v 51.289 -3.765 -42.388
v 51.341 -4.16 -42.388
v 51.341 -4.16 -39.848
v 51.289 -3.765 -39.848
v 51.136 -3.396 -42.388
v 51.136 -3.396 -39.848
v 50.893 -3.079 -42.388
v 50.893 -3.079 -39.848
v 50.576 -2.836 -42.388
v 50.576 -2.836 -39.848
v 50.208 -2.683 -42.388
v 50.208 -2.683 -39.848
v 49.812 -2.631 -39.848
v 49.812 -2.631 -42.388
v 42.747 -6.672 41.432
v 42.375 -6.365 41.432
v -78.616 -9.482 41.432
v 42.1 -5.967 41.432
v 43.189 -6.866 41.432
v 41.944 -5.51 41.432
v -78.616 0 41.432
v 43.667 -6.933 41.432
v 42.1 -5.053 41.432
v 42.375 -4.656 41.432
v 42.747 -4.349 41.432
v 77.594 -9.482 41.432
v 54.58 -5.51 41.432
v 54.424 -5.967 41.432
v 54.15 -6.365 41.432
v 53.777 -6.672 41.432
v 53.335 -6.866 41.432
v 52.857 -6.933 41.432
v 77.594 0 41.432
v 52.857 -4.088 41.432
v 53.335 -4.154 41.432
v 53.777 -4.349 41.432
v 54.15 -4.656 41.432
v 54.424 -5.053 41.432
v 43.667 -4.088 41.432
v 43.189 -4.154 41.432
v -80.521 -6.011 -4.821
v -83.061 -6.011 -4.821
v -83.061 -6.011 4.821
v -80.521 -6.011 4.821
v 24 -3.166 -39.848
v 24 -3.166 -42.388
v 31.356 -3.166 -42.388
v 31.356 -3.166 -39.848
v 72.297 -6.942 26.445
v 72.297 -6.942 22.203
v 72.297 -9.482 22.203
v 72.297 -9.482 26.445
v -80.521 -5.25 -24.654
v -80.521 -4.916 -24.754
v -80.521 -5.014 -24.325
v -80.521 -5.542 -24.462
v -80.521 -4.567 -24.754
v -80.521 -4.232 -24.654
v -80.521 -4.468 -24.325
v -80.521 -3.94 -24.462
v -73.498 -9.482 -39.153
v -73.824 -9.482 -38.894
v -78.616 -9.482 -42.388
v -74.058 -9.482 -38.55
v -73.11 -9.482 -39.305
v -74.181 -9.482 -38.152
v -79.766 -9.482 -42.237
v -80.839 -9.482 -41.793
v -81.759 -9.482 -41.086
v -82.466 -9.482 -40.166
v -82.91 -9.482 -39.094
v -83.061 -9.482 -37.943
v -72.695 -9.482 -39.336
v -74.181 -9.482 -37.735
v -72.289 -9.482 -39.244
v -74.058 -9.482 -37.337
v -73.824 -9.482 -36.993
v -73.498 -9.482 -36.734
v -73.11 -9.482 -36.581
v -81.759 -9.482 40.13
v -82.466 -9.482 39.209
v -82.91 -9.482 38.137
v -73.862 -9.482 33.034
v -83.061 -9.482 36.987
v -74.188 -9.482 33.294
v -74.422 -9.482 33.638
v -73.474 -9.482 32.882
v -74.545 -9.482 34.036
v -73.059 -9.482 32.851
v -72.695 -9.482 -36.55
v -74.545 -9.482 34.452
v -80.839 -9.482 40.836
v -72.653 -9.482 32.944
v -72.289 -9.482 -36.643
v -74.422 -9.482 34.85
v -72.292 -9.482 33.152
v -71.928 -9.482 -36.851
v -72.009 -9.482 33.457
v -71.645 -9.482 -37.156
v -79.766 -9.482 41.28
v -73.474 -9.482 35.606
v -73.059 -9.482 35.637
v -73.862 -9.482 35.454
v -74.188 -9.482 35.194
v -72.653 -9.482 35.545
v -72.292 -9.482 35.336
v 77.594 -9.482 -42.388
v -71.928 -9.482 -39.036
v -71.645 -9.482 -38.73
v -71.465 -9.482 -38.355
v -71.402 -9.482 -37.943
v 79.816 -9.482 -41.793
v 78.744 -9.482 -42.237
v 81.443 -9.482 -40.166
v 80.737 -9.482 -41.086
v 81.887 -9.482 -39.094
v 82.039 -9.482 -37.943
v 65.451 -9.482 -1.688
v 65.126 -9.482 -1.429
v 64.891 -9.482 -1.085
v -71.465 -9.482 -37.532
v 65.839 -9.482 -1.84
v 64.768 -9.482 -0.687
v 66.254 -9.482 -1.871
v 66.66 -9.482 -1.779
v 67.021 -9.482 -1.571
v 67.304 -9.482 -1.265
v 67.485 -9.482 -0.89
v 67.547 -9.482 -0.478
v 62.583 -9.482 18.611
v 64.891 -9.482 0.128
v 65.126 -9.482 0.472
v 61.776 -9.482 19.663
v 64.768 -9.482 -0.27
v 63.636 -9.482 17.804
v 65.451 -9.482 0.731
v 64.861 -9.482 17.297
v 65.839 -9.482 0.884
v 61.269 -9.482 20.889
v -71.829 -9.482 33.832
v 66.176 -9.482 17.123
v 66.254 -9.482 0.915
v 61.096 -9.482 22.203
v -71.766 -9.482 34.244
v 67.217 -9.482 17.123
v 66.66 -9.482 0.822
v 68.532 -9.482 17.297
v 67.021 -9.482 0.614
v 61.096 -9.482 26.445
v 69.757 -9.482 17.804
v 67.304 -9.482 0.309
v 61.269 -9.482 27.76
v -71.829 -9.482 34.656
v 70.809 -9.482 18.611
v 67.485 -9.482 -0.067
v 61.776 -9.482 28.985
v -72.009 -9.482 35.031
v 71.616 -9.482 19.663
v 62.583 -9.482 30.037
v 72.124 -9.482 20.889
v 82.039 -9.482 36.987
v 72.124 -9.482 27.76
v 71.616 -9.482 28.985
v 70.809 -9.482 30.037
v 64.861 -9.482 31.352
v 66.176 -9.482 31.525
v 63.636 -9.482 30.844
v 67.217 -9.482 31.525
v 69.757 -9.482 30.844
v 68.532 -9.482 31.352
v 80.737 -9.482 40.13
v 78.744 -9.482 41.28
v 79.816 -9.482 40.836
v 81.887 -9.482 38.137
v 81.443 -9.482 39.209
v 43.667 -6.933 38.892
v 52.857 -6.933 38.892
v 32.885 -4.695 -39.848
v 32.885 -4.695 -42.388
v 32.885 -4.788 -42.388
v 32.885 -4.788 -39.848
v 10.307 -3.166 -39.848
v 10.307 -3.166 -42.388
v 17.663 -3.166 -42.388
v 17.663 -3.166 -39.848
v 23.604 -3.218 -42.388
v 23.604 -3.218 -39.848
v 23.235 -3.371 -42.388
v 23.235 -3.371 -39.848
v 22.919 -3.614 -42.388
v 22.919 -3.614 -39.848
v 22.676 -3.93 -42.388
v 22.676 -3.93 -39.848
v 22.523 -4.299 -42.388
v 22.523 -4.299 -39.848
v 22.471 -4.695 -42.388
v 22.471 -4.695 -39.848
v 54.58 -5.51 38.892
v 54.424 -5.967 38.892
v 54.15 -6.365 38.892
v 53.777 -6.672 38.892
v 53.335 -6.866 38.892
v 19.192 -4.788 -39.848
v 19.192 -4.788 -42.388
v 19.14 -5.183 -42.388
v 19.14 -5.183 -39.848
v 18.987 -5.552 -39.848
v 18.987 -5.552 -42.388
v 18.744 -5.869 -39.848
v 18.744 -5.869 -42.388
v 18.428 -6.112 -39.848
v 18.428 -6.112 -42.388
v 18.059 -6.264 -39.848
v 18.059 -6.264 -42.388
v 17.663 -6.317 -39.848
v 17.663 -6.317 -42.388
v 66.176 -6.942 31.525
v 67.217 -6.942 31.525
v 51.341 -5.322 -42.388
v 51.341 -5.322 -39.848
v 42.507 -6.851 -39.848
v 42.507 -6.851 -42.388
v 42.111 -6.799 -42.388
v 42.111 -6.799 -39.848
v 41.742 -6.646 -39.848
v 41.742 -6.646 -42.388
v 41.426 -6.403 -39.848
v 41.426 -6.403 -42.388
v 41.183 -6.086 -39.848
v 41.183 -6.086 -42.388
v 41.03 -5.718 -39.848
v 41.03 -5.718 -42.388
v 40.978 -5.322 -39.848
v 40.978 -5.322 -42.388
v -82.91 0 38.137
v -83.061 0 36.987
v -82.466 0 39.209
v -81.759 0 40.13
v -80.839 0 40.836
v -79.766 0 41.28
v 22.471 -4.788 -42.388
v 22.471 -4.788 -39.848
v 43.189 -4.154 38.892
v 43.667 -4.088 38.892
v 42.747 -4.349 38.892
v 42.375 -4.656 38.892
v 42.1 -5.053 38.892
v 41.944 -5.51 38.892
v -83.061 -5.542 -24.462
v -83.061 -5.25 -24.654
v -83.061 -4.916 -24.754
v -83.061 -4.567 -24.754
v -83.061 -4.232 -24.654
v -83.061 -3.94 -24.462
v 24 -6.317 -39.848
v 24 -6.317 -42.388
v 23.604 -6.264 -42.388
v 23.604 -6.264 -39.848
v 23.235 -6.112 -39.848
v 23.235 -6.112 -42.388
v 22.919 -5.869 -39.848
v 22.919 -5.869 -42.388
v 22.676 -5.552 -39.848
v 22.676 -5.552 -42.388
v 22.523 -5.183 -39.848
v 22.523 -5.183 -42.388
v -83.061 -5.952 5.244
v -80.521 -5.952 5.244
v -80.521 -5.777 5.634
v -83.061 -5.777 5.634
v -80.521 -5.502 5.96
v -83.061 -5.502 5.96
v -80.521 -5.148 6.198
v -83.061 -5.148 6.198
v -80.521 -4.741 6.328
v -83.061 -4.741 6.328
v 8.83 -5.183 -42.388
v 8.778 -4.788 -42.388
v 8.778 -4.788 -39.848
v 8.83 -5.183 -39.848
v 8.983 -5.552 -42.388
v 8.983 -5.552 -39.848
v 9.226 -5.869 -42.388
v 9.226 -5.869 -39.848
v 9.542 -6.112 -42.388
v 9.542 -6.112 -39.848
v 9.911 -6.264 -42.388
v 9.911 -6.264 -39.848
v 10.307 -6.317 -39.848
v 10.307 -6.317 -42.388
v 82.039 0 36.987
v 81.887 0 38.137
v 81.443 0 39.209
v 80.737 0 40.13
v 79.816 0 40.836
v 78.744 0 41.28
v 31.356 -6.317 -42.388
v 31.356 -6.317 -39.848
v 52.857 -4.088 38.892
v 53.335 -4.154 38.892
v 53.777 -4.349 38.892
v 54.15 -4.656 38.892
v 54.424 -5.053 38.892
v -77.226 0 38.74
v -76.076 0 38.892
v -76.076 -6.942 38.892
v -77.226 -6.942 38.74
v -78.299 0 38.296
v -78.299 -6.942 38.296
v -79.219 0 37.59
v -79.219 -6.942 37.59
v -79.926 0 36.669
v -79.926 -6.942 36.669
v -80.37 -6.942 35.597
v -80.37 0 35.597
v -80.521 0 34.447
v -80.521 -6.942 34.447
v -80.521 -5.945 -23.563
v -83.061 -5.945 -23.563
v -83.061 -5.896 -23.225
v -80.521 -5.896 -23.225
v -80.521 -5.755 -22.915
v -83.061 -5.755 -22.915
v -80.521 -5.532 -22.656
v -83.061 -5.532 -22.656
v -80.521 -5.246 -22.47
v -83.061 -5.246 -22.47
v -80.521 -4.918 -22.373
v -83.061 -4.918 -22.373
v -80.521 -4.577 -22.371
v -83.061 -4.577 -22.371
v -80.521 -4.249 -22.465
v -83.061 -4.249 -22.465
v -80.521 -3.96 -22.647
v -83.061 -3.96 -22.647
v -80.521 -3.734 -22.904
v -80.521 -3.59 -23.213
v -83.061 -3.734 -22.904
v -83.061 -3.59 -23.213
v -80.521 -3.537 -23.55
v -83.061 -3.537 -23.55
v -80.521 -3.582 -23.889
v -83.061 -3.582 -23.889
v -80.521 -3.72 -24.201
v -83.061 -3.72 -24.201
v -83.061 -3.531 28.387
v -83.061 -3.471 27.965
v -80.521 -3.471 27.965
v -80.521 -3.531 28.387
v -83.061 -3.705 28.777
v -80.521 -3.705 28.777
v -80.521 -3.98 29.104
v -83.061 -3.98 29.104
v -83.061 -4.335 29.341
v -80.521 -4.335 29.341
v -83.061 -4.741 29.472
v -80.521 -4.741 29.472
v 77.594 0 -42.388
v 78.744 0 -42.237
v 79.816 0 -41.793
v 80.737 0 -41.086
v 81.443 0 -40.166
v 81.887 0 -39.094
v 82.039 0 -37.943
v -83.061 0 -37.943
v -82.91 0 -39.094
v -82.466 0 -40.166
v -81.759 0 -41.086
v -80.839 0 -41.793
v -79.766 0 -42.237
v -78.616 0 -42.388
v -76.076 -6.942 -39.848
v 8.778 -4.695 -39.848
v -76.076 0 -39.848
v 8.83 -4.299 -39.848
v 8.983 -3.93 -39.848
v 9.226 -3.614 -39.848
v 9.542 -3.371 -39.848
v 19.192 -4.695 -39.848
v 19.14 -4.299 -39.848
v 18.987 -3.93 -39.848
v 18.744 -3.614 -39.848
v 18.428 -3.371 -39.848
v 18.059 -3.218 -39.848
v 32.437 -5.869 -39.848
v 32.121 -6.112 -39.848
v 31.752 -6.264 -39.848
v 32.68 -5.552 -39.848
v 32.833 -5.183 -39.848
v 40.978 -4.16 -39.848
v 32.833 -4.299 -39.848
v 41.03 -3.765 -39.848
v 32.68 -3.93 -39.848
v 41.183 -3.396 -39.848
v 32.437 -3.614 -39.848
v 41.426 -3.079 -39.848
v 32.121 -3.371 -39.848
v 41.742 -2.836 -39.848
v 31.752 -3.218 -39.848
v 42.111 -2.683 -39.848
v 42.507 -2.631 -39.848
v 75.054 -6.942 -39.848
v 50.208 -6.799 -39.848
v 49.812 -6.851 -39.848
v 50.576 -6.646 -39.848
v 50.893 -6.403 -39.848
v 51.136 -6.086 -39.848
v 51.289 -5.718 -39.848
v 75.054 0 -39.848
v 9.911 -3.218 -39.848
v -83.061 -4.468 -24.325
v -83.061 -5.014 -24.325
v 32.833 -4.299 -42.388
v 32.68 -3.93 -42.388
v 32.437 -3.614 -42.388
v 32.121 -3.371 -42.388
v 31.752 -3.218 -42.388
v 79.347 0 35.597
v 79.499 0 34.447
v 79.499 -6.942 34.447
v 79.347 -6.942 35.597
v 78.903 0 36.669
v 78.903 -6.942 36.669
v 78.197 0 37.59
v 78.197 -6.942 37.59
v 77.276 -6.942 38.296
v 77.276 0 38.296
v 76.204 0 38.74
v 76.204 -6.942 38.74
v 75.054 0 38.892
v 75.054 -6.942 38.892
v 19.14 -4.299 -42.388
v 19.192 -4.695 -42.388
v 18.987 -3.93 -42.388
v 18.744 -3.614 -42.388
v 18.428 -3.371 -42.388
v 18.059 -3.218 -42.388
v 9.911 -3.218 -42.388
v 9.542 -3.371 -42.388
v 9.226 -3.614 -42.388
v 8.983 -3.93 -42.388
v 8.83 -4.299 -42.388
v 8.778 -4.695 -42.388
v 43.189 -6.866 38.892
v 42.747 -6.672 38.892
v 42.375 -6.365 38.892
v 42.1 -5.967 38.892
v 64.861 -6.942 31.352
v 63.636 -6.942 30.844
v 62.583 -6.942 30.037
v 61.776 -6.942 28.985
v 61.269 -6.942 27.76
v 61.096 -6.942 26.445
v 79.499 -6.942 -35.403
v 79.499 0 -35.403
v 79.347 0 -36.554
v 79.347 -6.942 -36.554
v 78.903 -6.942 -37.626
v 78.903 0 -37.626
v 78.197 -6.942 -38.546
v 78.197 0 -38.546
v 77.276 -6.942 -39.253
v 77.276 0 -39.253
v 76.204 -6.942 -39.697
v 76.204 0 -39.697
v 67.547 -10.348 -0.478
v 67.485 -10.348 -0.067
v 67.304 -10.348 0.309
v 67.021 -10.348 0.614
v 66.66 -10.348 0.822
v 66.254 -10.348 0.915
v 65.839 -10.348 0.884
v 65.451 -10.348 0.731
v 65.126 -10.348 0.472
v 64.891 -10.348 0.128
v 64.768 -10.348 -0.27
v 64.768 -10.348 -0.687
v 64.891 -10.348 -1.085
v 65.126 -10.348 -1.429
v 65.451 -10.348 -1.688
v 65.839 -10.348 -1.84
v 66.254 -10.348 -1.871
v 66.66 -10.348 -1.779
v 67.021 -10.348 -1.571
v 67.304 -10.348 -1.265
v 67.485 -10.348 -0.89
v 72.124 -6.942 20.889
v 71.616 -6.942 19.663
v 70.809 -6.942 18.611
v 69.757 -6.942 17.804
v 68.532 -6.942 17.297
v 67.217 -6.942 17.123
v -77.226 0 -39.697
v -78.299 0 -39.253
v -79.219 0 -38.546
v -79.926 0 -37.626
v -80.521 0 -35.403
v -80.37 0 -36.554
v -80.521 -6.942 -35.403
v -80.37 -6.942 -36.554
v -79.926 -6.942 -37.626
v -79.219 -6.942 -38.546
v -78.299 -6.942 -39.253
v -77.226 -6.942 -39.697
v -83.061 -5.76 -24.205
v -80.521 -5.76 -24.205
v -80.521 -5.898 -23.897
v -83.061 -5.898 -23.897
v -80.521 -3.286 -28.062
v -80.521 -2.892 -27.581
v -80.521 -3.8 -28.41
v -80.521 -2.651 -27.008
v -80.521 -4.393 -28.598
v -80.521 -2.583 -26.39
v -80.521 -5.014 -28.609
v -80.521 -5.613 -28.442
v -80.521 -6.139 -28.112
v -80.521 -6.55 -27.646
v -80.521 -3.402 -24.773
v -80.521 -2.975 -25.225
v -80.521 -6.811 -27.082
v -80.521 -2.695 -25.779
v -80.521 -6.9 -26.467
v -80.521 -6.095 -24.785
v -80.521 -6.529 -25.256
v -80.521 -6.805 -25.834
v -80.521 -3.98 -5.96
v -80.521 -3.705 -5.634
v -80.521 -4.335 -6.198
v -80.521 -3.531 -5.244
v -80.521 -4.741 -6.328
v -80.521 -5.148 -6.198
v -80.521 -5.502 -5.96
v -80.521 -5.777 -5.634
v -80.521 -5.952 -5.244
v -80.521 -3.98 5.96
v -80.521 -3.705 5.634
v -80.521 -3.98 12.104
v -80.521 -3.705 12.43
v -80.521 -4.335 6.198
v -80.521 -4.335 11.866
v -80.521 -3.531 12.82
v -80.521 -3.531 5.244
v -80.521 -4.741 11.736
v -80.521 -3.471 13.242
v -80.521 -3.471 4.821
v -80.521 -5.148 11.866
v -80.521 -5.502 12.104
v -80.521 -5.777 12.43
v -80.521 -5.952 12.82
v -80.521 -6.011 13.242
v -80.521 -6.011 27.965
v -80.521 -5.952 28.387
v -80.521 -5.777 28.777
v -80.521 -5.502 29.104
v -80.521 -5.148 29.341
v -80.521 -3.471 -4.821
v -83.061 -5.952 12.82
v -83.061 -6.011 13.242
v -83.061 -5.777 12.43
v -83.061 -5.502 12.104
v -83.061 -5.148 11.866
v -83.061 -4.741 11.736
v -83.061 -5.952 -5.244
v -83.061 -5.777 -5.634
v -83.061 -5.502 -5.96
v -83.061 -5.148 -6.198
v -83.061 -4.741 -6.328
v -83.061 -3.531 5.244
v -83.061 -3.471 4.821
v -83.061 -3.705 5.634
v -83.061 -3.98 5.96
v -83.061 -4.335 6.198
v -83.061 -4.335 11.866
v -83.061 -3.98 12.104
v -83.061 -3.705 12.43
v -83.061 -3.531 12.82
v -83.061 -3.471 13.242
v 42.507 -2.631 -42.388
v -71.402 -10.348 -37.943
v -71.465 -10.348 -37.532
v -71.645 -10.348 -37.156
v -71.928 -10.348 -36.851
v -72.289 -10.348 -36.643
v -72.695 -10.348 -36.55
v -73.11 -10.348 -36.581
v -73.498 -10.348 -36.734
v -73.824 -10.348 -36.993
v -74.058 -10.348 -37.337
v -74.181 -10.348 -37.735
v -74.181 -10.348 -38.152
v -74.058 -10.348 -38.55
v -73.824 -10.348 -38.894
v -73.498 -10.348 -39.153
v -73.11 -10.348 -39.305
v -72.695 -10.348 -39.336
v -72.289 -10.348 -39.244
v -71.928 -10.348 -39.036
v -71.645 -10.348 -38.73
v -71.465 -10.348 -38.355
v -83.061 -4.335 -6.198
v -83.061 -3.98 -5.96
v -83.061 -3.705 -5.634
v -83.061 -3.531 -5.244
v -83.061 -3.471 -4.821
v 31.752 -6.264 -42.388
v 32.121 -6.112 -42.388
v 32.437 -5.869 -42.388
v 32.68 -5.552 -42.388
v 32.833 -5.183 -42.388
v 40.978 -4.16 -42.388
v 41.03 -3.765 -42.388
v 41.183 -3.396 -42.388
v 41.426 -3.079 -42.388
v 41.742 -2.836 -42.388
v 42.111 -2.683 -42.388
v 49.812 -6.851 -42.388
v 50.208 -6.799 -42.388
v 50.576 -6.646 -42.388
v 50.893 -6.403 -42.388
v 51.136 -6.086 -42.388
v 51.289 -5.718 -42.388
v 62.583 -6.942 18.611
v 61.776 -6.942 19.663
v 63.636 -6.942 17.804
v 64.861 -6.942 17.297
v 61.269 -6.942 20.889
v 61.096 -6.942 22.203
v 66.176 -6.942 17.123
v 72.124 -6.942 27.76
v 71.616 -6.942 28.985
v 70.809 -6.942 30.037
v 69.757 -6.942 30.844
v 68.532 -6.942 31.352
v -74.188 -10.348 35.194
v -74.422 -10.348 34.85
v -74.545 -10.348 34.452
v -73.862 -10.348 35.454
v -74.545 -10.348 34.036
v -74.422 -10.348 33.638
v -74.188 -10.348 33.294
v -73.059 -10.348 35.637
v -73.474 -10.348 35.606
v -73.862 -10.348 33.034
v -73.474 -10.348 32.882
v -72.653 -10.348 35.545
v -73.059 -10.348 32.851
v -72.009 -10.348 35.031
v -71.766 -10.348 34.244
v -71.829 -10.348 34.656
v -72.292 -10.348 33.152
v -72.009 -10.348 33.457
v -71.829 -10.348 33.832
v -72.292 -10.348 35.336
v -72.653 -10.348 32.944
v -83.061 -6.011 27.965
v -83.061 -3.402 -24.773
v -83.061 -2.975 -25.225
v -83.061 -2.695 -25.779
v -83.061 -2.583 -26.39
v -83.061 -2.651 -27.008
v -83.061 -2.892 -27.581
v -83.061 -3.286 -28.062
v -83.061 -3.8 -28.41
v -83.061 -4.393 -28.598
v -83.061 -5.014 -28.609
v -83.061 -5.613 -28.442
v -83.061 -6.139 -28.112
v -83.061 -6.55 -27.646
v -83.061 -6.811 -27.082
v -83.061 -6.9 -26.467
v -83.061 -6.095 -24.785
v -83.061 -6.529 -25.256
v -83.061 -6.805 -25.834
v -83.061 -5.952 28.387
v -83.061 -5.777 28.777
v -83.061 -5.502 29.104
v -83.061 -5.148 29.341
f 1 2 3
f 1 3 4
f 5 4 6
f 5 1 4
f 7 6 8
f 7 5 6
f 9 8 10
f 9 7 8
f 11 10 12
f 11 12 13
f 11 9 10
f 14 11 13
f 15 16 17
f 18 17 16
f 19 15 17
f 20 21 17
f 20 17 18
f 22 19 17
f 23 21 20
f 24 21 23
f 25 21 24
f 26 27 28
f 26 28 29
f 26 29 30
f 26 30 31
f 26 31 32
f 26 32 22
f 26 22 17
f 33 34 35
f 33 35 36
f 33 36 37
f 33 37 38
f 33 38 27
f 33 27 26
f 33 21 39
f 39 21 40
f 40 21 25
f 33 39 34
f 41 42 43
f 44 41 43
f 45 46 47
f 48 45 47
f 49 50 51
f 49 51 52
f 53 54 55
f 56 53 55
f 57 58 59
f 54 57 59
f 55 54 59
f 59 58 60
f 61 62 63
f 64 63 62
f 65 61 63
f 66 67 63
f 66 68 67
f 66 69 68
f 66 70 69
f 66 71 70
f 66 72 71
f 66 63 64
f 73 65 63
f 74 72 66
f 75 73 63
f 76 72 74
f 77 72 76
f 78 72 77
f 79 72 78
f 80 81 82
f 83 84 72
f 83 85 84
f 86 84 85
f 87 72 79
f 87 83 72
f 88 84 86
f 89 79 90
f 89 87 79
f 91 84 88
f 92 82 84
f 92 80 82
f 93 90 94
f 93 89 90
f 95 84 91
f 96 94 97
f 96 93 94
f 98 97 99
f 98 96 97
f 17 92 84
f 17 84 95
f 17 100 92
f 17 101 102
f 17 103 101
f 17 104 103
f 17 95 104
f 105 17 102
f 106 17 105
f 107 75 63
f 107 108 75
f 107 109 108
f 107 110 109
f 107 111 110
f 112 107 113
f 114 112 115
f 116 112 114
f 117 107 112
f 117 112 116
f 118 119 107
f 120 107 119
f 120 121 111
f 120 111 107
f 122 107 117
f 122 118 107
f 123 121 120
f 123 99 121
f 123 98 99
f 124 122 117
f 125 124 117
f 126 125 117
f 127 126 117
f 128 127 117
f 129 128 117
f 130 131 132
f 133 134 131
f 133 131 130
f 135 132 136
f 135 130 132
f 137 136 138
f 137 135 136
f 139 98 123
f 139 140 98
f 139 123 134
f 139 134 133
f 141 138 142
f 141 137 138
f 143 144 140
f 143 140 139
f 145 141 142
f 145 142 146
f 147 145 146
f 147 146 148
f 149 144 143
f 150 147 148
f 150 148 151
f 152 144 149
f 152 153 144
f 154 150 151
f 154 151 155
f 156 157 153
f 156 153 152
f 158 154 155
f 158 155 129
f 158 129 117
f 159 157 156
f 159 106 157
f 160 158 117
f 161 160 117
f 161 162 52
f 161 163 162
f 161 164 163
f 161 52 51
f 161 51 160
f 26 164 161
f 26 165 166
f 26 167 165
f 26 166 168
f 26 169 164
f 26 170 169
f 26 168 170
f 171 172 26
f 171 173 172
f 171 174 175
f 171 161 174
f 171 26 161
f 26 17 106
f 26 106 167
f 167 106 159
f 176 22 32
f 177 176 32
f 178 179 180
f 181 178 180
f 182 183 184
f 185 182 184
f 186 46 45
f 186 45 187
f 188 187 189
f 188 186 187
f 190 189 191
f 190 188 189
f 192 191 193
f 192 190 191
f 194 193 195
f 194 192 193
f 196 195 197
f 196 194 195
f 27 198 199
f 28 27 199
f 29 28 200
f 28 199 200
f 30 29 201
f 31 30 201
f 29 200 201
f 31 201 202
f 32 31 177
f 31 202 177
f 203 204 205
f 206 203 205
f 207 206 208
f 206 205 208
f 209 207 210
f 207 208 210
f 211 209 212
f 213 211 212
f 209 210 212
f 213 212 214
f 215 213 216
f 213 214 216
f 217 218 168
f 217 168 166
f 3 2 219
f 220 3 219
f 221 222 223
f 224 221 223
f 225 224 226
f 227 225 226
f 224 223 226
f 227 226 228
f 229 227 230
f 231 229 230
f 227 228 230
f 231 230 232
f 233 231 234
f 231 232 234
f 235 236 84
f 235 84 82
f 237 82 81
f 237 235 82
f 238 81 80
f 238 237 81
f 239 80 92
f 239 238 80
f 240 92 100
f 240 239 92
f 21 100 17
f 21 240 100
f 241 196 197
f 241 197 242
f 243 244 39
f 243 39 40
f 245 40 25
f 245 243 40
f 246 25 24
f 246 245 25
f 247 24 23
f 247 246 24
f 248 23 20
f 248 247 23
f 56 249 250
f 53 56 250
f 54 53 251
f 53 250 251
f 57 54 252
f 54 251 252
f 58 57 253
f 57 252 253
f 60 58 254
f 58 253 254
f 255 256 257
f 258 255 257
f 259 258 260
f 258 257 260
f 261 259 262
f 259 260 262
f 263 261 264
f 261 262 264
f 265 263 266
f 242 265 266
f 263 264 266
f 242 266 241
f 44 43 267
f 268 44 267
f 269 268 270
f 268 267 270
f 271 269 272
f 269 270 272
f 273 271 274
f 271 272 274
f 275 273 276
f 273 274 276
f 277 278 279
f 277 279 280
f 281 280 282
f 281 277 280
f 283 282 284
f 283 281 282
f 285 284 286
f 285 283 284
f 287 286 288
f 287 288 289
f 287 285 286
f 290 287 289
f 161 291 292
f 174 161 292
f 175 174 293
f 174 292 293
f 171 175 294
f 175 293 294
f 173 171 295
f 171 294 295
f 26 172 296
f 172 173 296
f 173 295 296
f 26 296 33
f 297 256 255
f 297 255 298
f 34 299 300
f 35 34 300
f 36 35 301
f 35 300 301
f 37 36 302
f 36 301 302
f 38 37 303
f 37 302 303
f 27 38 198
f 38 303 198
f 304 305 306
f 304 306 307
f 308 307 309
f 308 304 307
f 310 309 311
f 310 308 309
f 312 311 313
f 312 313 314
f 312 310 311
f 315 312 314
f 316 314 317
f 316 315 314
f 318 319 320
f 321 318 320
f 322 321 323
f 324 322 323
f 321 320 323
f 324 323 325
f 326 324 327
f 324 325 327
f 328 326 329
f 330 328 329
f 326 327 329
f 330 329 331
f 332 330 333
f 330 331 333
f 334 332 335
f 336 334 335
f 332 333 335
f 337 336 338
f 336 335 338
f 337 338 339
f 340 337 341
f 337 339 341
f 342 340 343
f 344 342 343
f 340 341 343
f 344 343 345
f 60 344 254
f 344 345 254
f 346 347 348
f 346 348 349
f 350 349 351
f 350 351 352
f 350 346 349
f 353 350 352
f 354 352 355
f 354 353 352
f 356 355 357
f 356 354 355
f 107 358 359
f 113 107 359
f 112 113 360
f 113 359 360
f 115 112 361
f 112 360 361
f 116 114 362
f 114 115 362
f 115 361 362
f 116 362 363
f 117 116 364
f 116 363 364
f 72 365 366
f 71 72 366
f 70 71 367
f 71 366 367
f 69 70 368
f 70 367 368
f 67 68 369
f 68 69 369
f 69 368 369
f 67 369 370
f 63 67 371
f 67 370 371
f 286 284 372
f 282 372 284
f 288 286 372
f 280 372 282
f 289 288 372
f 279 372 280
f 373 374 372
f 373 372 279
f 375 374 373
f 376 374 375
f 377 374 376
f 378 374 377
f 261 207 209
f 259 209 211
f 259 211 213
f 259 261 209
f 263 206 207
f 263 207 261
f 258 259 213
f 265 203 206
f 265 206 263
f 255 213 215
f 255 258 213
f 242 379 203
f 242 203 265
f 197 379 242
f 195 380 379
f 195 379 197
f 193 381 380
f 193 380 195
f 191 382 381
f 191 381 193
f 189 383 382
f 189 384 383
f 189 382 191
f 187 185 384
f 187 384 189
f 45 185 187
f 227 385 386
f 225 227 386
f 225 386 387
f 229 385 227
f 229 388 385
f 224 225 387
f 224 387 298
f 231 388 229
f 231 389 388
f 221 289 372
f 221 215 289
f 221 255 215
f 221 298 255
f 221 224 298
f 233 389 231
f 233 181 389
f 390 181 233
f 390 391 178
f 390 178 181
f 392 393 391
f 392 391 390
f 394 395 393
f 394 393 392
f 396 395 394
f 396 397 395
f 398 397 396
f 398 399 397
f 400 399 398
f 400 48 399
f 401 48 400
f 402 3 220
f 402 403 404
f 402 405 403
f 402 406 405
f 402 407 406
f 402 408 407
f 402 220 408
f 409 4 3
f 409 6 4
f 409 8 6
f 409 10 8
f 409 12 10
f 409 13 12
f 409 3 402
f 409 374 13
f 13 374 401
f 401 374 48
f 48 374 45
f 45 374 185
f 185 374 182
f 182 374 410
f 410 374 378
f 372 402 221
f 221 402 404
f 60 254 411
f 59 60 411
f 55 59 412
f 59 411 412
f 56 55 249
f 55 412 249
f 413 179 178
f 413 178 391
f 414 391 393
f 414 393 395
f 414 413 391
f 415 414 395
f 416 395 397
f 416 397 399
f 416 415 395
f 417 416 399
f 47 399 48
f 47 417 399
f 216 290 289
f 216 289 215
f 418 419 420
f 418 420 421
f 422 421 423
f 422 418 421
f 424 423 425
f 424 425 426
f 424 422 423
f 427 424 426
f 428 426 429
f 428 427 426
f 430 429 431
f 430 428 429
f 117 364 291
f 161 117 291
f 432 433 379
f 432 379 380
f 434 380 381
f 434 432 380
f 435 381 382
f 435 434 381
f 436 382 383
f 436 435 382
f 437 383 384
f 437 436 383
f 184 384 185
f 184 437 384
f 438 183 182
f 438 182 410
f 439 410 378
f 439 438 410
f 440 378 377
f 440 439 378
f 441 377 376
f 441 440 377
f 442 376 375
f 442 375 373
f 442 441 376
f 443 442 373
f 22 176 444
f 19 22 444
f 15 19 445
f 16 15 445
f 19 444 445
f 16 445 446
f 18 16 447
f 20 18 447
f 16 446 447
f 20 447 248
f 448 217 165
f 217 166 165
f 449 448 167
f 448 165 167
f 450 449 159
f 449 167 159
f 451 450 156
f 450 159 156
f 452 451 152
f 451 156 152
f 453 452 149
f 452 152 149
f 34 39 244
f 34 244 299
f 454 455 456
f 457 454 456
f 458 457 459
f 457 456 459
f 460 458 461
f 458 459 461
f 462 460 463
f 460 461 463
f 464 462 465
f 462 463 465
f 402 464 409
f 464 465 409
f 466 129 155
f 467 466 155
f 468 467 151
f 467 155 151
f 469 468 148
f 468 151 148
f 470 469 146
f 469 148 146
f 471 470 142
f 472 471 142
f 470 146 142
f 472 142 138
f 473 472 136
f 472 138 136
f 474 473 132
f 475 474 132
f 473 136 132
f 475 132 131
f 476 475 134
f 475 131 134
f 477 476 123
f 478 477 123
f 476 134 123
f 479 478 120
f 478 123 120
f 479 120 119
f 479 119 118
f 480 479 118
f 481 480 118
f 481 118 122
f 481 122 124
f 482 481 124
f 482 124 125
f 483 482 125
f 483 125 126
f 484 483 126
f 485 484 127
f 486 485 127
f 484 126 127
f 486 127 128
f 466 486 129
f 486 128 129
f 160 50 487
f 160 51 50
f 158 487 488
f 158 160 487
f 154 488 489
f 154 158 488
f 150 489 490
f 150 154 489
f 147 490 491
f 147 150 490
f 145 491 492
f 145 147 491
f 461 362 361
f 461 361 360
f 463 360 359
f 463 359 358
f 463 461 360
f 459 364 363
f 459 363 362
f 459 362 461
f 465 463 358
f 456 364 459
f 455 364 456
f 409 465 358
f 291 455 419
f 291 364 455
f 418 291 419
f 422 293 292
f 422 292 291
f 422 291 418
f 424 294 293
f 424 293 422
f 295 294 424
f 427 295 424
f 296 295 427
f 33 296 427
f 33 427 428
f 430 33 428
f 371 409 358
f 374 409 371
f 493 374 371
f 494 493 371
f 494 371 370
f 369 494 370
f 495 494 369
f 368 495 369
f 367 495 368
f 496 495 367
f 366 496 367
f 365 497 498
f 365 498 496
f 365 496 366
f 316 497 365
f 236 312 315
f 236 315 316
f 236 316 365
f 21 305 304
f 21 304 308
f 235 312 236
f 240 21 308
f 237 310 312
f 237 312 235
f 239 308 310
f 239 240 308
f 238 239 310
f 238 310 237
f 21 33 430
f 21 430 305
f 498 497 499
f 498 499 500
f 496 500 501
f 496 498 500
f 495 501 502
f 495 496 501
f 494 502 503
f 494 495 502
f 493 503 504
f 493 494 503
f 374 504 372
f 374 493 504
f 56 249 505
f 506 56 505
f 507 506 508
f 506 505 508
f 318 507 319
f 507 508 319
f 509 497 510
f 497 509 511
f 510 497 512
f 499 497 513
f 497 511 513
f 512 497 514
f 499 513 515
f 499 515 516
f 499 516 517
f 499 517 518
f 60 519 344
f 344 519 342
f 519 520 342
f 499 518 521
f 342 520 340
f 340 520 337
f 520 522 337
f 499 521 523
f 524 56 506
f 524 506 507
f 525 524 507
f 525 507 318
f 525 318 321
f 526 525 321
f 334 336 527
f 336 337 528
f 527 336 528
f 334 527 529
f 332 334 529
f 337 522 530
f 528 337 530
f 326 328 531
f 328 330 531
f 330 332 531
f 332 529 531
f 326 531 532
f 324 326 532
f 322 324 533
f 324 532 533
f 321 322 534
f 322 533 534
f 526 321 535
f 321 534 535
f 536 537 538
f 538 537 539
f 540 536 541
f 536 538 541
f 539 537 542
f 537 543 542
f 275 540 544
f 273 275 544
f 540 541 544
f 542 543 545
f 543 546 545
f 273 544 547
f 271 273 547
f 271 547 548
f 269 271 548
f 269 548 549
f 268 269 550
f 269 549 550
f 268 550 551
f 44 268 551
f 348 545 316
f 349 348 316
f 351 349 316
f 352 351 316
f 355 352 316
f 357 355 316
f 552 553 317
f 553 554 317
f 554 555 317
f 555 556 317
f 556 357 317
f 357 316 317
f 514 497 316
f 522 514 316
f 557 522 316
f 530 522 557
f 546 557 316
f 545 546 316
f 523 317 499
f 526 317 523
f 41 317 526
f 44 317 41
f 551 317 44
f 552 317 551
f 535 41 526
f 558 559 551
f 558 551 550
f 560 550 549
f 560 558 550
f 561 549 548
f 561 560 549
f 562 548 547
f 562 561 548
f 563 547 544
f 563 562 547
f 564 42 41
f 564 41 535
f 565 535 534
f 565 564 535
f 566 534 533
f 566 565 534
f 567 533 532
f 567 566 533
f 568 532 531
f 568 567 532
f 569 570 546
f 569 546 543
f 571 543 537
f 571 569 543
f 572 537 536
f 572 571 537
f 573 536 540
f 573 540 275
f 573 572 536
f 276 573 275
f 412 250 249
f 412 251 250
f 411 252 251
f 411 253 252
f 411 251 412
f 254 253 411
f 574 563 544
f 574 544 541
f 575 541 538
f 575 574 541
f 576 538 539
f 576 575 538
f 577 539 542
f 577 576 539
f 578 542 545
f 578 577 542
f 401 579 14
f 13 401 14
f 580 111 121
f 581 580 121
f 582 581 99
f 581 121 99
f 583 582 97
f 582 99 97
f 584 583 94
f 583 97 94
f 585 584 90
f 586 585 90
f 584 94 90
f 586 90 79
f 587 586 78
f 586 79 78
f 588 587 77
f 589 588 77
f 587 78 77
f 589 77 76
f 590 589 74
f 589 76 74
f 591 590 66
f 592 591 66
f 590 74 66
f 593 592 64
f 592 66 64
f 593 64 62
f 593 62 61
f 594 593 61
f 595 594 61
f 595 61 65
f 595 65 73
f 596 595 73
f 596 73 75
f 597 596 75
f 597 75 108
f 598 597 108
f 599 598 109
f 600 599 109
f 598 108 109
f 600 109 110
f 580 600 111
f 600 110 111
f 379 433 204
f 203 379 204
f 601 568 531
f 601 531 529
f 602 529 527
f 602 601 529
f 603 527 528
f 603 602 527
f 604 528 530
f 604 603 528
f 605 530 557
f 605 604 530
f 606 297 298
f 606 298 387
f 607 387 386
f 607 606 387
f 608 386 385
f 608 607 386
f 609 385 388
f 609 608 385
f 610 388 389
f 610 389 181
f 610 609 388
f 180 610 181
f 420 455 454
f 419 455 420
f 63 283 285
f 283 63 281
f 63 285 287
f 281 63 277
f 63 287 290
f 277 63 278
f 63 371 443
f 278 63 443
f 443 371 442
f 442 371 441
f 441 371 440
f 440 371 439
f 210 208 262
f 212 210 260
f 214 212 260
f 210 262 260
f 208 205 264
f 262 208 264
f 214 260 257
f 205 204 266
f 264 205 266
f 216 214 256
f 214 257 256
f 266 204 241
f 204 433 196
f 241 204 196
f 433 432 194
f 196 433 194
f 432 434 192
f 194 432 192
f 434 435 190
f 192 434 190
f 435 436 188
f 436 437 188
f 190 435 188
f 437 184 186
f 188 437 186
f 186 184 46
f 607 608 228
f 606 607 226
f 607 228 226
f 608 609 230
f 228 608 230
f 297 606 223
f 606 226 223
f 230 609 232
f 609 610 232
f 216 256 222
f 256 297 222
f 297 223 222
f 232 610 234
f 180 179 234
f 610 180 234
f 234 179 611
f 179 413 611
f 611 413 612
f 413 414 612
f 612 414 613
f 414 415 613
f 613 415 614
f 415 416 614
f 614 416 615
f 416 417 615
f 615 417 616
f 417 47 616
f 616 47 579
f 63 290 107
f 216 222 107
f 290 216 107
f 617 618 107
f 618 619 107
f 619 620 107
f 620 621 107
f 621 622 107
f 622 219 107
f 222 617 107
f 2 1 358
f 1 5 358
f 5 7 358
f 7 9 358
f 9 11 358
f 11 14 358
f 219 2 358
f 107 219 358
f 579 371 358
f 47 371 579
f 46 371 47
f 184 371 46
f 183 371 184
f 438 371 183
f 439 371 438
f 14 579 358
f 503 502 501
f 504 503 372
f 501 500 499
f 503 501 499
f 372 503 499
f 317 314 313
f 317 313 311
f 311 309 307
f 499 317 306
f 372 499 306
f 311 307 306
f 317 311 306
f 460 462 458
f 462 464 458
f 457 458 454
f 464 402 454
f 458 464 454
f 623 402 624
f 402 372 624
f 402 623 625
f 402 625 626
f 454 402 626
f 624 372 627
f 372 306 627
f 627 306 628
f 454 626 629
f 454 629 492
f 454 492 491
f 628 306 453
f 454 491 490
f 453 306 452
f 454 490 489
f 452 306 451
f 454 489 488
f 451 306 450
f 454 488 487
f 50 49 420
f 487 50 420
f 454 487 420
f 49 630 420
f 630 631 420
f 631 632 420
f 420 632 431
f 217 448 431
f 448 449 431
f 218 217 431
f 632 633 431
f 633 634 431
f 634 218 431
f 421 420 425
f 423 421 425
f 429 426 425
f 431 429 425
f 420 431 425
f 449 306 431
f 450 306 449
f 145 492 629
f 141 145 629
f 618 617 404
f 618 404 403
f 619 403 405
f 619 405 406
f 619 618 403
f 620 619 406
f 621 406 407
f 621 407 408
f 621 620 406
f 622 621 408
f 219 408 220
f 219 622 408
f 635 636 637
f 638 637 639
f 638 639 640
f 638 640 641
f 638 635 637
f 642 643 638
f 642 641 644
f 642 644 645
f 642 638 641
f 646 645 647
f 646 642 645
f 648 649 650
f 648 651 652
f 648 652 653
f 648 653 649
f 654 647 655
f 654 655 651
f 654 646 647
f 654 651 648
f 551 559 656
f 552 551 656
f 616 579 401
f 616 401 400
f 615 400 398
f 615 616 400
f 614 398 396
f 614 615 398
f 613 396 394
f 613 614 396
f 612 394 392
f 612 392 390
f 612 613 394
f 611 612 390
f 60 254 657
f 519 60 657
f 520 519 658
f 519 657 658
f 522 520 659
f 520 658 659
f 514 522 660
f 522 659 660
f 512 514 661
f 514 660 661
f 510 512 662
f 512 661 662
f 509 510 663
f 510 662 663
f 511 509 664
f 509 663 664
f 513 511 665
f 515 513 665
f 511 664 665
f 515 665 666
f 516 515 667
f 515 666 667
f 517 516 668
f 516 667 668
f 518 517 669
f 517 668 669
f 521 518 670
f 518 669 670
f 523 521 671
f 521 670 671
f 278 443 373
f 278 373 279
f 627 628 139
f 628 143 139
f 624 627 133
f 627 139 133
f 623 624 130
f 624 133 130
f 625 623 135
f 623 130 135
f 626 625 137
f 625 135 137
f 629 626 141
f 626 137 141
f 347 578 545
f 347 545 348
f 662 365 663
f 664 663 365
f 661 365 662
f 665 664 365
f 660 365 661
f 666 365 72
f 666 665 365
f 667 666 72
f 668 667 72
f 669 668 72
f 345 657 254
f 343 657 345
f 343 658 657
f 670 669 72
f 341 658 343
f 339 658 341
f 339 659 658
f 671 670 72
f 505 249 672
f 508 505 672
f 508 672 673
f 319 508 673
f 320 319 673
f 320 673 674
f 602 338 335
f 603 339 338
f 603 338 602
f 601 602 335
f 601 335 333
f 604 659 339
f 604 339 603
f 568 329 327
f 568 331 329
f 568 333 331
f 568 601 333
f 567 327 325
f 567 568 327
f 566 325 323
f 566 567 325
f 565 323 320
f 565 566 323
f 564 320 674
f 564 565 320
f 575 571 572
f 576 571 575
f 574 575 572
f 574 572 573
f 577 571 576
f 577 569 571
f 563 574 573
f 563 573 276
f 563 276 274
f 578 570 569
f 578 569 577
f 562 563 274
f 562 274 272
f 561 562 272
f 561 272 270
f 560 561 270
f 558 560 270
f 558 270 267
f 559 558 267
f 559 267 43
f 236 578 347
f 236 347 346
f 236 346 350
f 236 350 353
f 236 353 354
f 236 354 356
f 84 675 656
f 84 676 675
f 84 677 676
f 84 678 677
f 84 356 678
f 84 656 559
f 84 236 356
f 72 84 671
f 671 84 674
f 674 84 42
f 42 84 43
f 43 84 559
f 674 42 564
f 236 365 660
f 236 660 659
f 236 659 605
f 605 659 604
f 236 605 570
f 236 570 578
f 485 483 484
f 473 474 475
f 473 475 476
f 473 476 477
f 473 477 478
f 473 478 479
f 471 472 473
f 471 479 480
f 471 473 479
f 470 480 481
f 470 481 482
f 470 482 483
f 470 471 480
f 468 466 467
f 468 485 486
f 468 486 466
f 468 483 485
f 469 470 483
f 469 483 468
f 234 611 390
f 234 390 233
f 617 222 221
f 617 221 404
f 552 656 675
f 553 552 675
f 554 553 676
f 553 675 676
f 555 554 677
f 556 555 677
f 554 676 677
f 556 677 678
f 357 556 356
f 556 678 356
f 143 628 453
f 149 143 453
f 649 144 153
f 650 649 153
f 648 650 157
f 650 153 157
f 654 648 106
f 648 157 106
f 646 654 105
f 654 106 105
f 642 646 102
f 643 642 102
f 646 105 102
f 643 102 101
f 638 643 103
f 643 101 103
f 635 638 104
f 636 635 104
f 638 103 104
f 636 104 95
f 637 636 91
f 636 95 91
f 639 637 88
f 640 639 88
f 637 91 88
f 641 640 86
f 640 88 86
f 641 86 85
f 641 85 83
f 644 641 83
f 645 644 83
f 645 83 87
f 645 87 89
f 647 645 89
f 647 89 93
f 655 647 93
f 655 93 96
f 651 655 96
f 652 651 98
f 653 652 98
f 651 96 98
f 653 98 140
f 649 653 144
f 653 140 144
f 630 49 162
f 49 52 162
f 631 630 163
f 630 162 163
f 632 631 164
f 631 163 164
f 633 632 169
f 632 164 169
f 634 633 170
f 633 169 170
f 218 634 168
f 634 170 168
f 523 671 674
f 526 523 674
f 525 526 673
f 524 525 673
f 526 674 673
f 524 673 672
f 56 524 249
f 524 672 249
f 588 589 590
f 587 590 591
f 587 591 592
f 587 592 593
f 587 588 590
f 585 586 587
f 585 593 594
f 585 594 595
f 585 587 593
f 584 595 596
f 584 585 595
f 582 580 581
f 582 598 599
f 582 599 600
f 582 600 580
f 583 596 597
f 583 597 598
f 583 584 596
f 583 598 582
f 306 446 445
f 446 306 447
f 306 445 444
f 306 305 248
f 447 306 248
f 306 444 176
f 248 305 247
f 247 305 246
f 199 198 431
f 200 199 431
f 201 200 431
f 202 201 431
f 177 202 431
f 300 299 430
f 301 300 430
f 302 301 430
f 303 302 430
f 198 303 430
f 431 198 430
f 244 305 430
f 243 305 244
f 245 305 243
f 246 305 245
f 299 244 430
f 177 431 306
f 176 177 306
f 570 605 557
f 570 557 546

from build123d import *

# Parameters (mm, degrees)
F0_W         = 160.02
F0_H         = 78.74
F1_DEPTH     = 6.94228
F2_T         = 2.54
F3_T1_DEPTH  = 6.94228
F3_T3_DEPTH  = 31.70728
F4_W         = 11.2012028694
F4_H         = 14.4015364349
F6_DEPTH     = 25.4
F7_R         = 5.08
F8_W         = 2.54
F8_H         = 12.7
F8_H_2       = 17.78
F9_DEPTH     = 25.4
F10_W        = 10.3627294302
F10_H        = 4.2195547159
F10_W_2      = 10.414
F10_H_2      = 3.1508285339
F11_DEPTH    = 25.4
F12_T1_DEPTH = 2.54
F12_T3_DEPTH = 2.54
F13_W        = 12.7
F13_H        = 2.8448
F14_DEPTH    = 25.4
F15_T1_DEPTH = 2.54
F16_R        = 1.397
F17_DEPTH    = 0.86535


# Not quite as in the source:
# - a fillet or chamfer that OpenCascade refuses, or shapes differently, is made with other operations: its cross-section is extruded or revolved along the edge and cut away or added


with BuildPart() as f1:
    # F0 (on Front) → F1 (new body)
    with BuildSketch(Plane.XZ):
        with Locations((-0.5110458827, -0.4783872414)):
            Rectangle(F0_W, F0_H)
    extrude(amount=F1_DEPTH)

    # F2
    f2_openings = [f1.faces().sort_by_distance(p)[0] for p in [
        (-0.511046, 0, -0.478387),
    ]]
    offset(amount=F2_T, openings=f2_openings, kind=Kind.INTERSECTION)

    # F3: fillet of radius 4.445 on 8 edges, made by hand

    # F3_s2 → F3_t1 (join)
    with BuildSketch(Plane.XZ):
        with BuildLine():
            ThreePointArc((-76.0760458827, 38.8916127586), (-79.2191355251, 37.589702401), (-80.5210458827, 34.4466127586))
            Line((-80.5210458827, 34.4466127586), (-80.5210458827, 38.8916127586))
            Line((-80.5210458827, 38.8916127586), (-76.0760458827, 38.8916127586))
        make_face()
        with BuildLine():
            ThreePointArc((-80.5210458827, -35.4033872414), (-79.2191355251, -38.5464768837), (-76.0760458827, -39.8483872414))
            Line((-76.0760458827, -39.8483872414), (-80.5210458827, -39.8483872414))
            Line((-80.5210458827, -39.8483872414), (-80.5210458827, -35.4033872414))
        make_face()
        with BuildLine():
            ThreePointArc((79.4989541173, -35.4033872414), (78.1970437597, -38.5464768837), (75.0539541173, -39.8483872414))
            Line((75.0539541173, -39.8483872414), (79.4989541173, -39.8483872414))
            Line((79.4989541173, -39.8483872414), (79.4989541173, -35.4033872414))
        make_face()
        with BuildLine():
            ThreePointArc((79.4989541173, 34.4466127586), (78.1970437597, 37.589702401), (75.0539541173, 38.8916127586))
            Line((75.0539541173, 38.8916127586), (79.4989541173, 38.8916127586))
            Line((79.4989541173, 38.8916127586), (79.4989541173, 34.4466127586))
        make_face()
    extrude(amount=F3_T1_DEPTH)

    # F3_s4 → F3_t3 (cut)
    with BuildSketch(Plane.XZ.offset(-11.1125)):
        with BuildLine():
            ThreePointArc((77.5939541173, -42.3883872414), (80.7370437597, -41.0864768837), (82.0389541173, -37.9433872414))
            Line((82.0389541173, -37.9433872414), (82.0389541173, -42.3883872414))
            Line((82.0389541173, -42.3883872414), (77.5939541173, -42.3883872414))
        make_face()
        with BuildLine():
            ThreePointArc((82.0389541173, 36.9866127586), (80.7370437597, 40.129702401), (77.5939541173, 41.4316127586))
            Line((77.5939541173, 41.4316127586), (82.0389541173, 41.4316127586))
            Line((82.0389541173, 41.4316127586), (82.0389541173, 36.9866127586))
        make_face()
        with BuildLine():
            ThreePointArc((-83.0610458827, 36.9866127586), (-81.7591355251, 40.129702401), (-78.6160458827, 41.4316127586))
            Line((-78.6160458827, 41.4316127586), (-83.0610458827, 41.4316127586))
            Line((-83.0610458827, 41.4316127586), (-83.0610458827, 36.9866127586))
        make_face()
        with BuildLine():
            ThreePointArc((-83.0610458827, -37.9433872414), (-81.7591355251, -41.0864768837), (-78.6160458827, -42.3883872414))
            Line((-78.6160458827, -42.3883872414), (-83.0610458827, -42.3883872414))
            Line((-83.0610458827, -42.3883872414), (-83.0610458827, -37.9433872414))
        make_face()
    extrude(amount=F3_T3_DEPTH, mode=Mode.SUBTRACT)

    # F4 (on face) → F6 (cut)
    with BuildSketch(Plane(origin=(0, -6.94228, 0), x_dir=(-1, 0, 0), z_dir=(0, 1, 0))):
        with Locations((-66.6961297393, 24.3242625147)):
            Rectangle(F4_W, F4_H)
    extrude(amount=-F6_DEPTH, mode=Mode.SUBTRACT)

    # F7
    f7_edges = [f1.edges().sort_by_distance(p)[0] for p in [
        (72.296731, -8.21228, 31.525031),
        (72.296731, -8.21228, 17.123494),
        (61.095528, -8.21228, 31.525031),
        (61.095528, -8.21228, 17.123494),
    ]]
    fillet(f7_edges, radius=F7_R)

    # F8 (on face) → F9 (cut)
    with BuildSketch(Plane(origin=(-83.0610458827, 0, 0), x_dir=(0, -1, 0), z_dir=(-1, 0, 0))):
        with BuildLine():
            ThreePointArc((3.9402758845, -24.4620272314), (3.5303106613, -28.2545002504), (6.90014, -26.4669954777))
            ThreePointArc((6.90014, -26.4669954777), (6.5286447728, -25.256166139), (5.5420041155, -24.4620272314))
            ThreePointArc((5.5420041155, -24.4620272314), (4.74114, -24.7671066221), (3.9402758845, -24.4620272314))
        make_face()
        with BuildLine():
            ThreePointArc((3.9402758845, -24.4620272314), (4.74114, -24.3079954777), (5.5420041155, -24.4620272314))
            ThreePointArc((5.5420041155, -24.4620272314), (5.8395341143, -24.0557928593), (5.9448541617, -23.5633924603))
            ThreePointArc((5.9448541617, -23.5633924603), (4.2487396011, -22.4649983461), (3.9402758845, -24.4620272314))
        make_face()
        with Locations((4.74114, 0)):
            Rectangle(F8_W, F8_H)
        with Locations((4.74114, 20.6036127586)):
            Rectangle(F8_W, F8_H_2)
    extrude(amount=-F9_DEPTH, mode=Mode.SUBTRACT)

    # F10 (on face) → F11 (cut)
    with BuildSketch(Plane(origin=(0, 0, -42.3883872414), x_dir=(1, 0, 0), z_dir=(0, 0, -1))):
        with Locations((46.1594350636, 4.74114)):
            Rectangle(F10_W, F10_H)
        with Locations((27.6780048452, 4.74114)):
            Rectangle(F10_W_2, F10_H_2)
        with Locations((13.9850524713, 4.74114)):
            Rectangle(F10_W_2, F10_H_2)
    extrude(amount=-F11_DEPTH, mode=Mode.SUBTRACT)

    # F12: fillet of radius 1.5288490226 on 20 edges, made by hand

    # F12_s2 → F12_t1 (join)
    with BuildSketch(Plane.XY.offset(-42.3883872414)):
        with BuildLine():
            ThreePointArc((19.1920524713, -4.7877052443), (18.7442629599, -5.8687647556), (17.6632034486, -6.316554267))
            Line((17.6632034486, -6.316554267), (19.1920524713, -6.316554267))
            Line((19.1920524713, -6.316554267), (19.1920524713, -4.7877052443))
        make_face()
        with BuildLine():
            ThreePointArc((8.7780524713, -4.7877052443), (9.2258419826, -5.8687647556), (10.3069014939, -6.316554267))
            Line((10.3069014939, -6.316554267), (8.7780524713, -6.316554267))
            Line((8.7780524713, -6.316554267), (8.7780524713, -4.7877052443))
        make_face()
        with BuildLine():
            ThreePointArc((10.3069014939, -3.165725733), (9.2258419826, -3.6135152444), (8.7780524713, -4.6945747557))
            Line((8.7780524713, -4.6945747557), (8.7780524713, -3.165725733))
            Line((8.7780524713, -3.165725733), (10.3069014939, -3.165725733))
        make_face()
        with BuildLine():
            ThreePointArc((19.1920524713, -4.6945747557), (18.7442629599, -3.6135152444), (17.6632034486, -3.165725733))
            Line((17.6632034486, -3.165725733), (19.1920524713, -3.165725733))
            Line((19.1920524713, -3.165725733), (19.1920524713, -4.6945747557))
        make_face()
        with BuildLine():
            ThreePointArc((31.3561558226, -6.316554267), (32.4372153339, -5.8687647556), (32.8850048452, -4.7877052443))
            Line((32.8850048452, -4.7877052443), (32.8850048452, -6.316554267))
            Line((32.8850048452, -6.316554267), (31.3561558226, -6.316554267))
        make_face()
        with BuildLine():
            ThreePointArc((32.8850048452, -4.6945747557), (32.4372153339, -3.6135152444), (31.3561558226, -3.165725733))
            Line((31.3561558226, -3.165725733), (32.8850048452, -3.165725733))
            Line((32.8850048452, -3.165725733), (32.8850048452, -4.6945747557))
        make_face()
        with BuildLine():
            ThreePointArc((23.9998538678, -6.316554267), (22.9187943565, -5.8687647556), (22.4710048452, -4.7877052443))
            Line((22.4710048452, -4.7877052443), (22.4710048452, -6.316554267))
            Line((22.4710048452, -6.316554267), (23.9998538678, -6.316554267))
        make_face()
        with BuildLine():
            ThreePointArc((23.9998538678, -3.165725733), (22.9187943565, -3.6135152444), (22.4710048452, -4.6945747557))
            Line((22.4710048452, -4.6945747557), (22.4710048452, -3.165725733))
            Line((22.4710048452, -3.165725733), (23.9998538678, -3.165725733))
        make_face()
        with BuildLine():
            ThreePointArc((51.3407997787, -4.1602116647), (50.8930102674, -3.0791521534), (49.8119507561, -2.631362642))
            Line((49.8119507561, -2.631362642), (51.3407997787, -2.631362642))
            Line((51.3407997787, -2.631362642), (51.3407997787, -4.1602116647))
        make_face()
        with BuildLine():
            ThreePointArc((49.8119507561, -6.850917358), (50.8930102674, -6.4031278466), (51.3407997787, -5.3220683353))
            Line((51.3407997787, -5.3220683353), (51.3407997787, -6.850917358))
            Line((51.3407997787, -6.850917358), (49.8119507561, -6.850917358))
        make_face()
        with BuildLine():
            ThreePointArc((42.5069193711, -6.850917358), (41.4258598598, -6.4031278466), (40.9780703485, -5.3220683353))
            Line((40.9780703485, -5.3220683353), (40.9780703485, -6.850917358))
            Line((40.9780703485, -6.850917358), (42.5069193711, -6.850917358))
        make_face()
        with BuildLine():
            ThreePointArc((42.5069193711, -2.631362642), (41.4258598598, -3.0791521534), (40.9780703485, -4.1602116647))
            Line((40.9780703485, -4.1602116647), (40.9780703485, -2.631362642))
            Line((40.9780703485, -2.631362642), (42.5069193711, -2.631362642))
        make_face()
    extrude(amount=F12_T1_DEPTH)

    # F12_s4 → F12_t3 (join)
    with BuildSketch(Plane.YZ.offset(-83.0610458827)):
        with BuildLine():
            ThreePointArc((-4.9999890226, 11.7136127586), (-3.9189295113, 12.16140227), (-3.47114, 13.2424617813))
            Line((-3.47114, 13.2424617813), (-3.47114, 11.7136127586))
            Line((-3.47114, 11.7136127586), (-4.9999890226, 11.7136127586))
        make_face()
        with BuildLine():
            ThreePointArc((-6.01114, 27.964763736), (-5.5633504887, 29.0458232473), (-4.4822909774, 29.4936127586))
            Line((-4.4822909774, 29.4936127586), (-6.01114, 29.4936127586))
            Line((-6.01114, 29.4936127586), (-6.01114, 27.964763736))
        make_face()
        with BuildLine():
            ThreePointArc((-3.47114, 27.964763736), (-3.9189295113, 29.0458232473), (-4.9999890226, 29.4936127586))
            Line((-4.9999890226, 29.4936127586), (-3.47114, 29.4936127586))
            Line((-3.47114, 29.4936127586), (-3.47114, 27.964763736))
        make_face()
        with BuildLine():
            ThreePointArc((-6.01114, 13.2424617813), (-5.5633504887, 12.16140227), (-4.4822909774, 11.7136127586))
            Line((-4.4822909774, 11.7136127586), (-6.01114, 11.7136127586))
            Line((-6.01114, 11.7136127586), (-6.01114, 13.2424617813))
        make_face()
        with BuildLine():
            ThreePointArc((-6.01114, 4.8211509774), (-5.5633504887, 5.9022104887), (-4.4822909774, 6.35))
            Line((-4.4822909774, 6.35), (-6.01114, 6.35))
            Line((-6.01114, 6.35), (-6.01114, 4.8211509774))
        make_face()
        with BuildLine():
            ThreePointArc((-6.01114, -4.8211509774), (-5.5633504887, -5.9022104887), (-4.4822909774, -6.35))
            Line((-4.4822909774, -6.35), (-6.01114, -6.35))
            Line((-6.01114, -6.35), (-6.01114, -4.8211509774))
        make_face()
        with BuildLine():
            ThreePointArc((-4.9999890226, -6.35), (-3.9189295113, -5.9022104887), (-3.47114, -4.8211509774))
            Line((-3.47114, -4.8211509774), (-3.47114, -6.35))
            Line((-3.47114, -6.35), (-4.9999890226, -6.35))
        make_face()
        with BuildLine():
            ThreePointArc((-3.47114, 4.8211509774), (-3.9189295113, 5.9022104887), (-4.9999890226, 6.35))
            Line((-4.9999890226, 6.35), (-3.47114, 6.35))
            Line((-3.47114, 6.35), (-3.47114, 4.8211509774))
        make_face()
    extrude(amount=F12_T3_DEPTH)

    # F13 (on face) → F14 (cut)
    with BuildSketch(Plane.XY.offset(41.4316127586)):
        with Locations((48.2621807605, -5.5104298601)):
            Rectangle(F13_W, F13_H)
    extrude(amount=-F14_DEPTH, mode=Mode.SUBTRACT)

    # F15: fillet of radius 1.7551815441 on 4 edges, made by hand

    # F15_s2 → F15_t1 (join)
    with BuildSketch(Plane.XY.offset(38.8916127586)):
        with BuildLine():
            ThreePointArc((52.8569992164, -4.0880298601), (54.0980999884, -4.6021106321), (54.6121807605, -5.8432114042))
            Line((54.6121807605, -5.8432114042), (54.6121807605, -4.0880298601))
            Line((54.6121807605, -4.0880298601), (52.8569992164, -4.0880298601))
        make_face()
        with BuildLine():
            ThreePointArc((43.6673623046, -4.0880298601), (42.4262615326, -4.6021106321), (41.9121807605, -5.8432114042))
            Line((41.9121807605, -5.8432114042), (41.9121807605, -4.0880298601))
            Line((41.9121807605, -4.0880298601), (43.6673623046, -4.0880298601))
        make_face()
        with BuildLine():
            ThreePointArc((54.6121807605, -5.177648316), (54.0980999884, -6.418749088), (52.8569992164, -6.9328298601))
            Line((52.8569992164, -6.9328298601), (54.6121807605, -6.9328298601))
            Line((54.6121807605, -6.9328298601), (54.6121807605, -5.177648316))
        make_face()
        with BuildLine():
            ThreePointArc((43.6673623046, -6.9328298601), (42.4262615326, -6.418749088), (41.9121807605, -5.177648316))
            Line((41.9121807605, -5.177648316), (41.9121807605, -6.9328298601))
            Line((41.9121807605, -6.9328298601), (43.6673623046, -6.9328298601))
        make_face()
    extrude(amount=F15_T1_DEPTH)

    # F16 (on face) → F17 (join)
    with BuildSketch(Plane.XZ.offset(9.48228)):
        with Locations((66.1496967077, -0.4783872414)):
            Circle(F16_R)
        with Locations((-73.1634646654, 34.2442020774)):
            Circle(F16_R)
        with Locations((-72.7994458827, -37.9433872414)):
            Circle(F16_R)
    extrude(amount=F17_DEPTH)


solid = f1.part
